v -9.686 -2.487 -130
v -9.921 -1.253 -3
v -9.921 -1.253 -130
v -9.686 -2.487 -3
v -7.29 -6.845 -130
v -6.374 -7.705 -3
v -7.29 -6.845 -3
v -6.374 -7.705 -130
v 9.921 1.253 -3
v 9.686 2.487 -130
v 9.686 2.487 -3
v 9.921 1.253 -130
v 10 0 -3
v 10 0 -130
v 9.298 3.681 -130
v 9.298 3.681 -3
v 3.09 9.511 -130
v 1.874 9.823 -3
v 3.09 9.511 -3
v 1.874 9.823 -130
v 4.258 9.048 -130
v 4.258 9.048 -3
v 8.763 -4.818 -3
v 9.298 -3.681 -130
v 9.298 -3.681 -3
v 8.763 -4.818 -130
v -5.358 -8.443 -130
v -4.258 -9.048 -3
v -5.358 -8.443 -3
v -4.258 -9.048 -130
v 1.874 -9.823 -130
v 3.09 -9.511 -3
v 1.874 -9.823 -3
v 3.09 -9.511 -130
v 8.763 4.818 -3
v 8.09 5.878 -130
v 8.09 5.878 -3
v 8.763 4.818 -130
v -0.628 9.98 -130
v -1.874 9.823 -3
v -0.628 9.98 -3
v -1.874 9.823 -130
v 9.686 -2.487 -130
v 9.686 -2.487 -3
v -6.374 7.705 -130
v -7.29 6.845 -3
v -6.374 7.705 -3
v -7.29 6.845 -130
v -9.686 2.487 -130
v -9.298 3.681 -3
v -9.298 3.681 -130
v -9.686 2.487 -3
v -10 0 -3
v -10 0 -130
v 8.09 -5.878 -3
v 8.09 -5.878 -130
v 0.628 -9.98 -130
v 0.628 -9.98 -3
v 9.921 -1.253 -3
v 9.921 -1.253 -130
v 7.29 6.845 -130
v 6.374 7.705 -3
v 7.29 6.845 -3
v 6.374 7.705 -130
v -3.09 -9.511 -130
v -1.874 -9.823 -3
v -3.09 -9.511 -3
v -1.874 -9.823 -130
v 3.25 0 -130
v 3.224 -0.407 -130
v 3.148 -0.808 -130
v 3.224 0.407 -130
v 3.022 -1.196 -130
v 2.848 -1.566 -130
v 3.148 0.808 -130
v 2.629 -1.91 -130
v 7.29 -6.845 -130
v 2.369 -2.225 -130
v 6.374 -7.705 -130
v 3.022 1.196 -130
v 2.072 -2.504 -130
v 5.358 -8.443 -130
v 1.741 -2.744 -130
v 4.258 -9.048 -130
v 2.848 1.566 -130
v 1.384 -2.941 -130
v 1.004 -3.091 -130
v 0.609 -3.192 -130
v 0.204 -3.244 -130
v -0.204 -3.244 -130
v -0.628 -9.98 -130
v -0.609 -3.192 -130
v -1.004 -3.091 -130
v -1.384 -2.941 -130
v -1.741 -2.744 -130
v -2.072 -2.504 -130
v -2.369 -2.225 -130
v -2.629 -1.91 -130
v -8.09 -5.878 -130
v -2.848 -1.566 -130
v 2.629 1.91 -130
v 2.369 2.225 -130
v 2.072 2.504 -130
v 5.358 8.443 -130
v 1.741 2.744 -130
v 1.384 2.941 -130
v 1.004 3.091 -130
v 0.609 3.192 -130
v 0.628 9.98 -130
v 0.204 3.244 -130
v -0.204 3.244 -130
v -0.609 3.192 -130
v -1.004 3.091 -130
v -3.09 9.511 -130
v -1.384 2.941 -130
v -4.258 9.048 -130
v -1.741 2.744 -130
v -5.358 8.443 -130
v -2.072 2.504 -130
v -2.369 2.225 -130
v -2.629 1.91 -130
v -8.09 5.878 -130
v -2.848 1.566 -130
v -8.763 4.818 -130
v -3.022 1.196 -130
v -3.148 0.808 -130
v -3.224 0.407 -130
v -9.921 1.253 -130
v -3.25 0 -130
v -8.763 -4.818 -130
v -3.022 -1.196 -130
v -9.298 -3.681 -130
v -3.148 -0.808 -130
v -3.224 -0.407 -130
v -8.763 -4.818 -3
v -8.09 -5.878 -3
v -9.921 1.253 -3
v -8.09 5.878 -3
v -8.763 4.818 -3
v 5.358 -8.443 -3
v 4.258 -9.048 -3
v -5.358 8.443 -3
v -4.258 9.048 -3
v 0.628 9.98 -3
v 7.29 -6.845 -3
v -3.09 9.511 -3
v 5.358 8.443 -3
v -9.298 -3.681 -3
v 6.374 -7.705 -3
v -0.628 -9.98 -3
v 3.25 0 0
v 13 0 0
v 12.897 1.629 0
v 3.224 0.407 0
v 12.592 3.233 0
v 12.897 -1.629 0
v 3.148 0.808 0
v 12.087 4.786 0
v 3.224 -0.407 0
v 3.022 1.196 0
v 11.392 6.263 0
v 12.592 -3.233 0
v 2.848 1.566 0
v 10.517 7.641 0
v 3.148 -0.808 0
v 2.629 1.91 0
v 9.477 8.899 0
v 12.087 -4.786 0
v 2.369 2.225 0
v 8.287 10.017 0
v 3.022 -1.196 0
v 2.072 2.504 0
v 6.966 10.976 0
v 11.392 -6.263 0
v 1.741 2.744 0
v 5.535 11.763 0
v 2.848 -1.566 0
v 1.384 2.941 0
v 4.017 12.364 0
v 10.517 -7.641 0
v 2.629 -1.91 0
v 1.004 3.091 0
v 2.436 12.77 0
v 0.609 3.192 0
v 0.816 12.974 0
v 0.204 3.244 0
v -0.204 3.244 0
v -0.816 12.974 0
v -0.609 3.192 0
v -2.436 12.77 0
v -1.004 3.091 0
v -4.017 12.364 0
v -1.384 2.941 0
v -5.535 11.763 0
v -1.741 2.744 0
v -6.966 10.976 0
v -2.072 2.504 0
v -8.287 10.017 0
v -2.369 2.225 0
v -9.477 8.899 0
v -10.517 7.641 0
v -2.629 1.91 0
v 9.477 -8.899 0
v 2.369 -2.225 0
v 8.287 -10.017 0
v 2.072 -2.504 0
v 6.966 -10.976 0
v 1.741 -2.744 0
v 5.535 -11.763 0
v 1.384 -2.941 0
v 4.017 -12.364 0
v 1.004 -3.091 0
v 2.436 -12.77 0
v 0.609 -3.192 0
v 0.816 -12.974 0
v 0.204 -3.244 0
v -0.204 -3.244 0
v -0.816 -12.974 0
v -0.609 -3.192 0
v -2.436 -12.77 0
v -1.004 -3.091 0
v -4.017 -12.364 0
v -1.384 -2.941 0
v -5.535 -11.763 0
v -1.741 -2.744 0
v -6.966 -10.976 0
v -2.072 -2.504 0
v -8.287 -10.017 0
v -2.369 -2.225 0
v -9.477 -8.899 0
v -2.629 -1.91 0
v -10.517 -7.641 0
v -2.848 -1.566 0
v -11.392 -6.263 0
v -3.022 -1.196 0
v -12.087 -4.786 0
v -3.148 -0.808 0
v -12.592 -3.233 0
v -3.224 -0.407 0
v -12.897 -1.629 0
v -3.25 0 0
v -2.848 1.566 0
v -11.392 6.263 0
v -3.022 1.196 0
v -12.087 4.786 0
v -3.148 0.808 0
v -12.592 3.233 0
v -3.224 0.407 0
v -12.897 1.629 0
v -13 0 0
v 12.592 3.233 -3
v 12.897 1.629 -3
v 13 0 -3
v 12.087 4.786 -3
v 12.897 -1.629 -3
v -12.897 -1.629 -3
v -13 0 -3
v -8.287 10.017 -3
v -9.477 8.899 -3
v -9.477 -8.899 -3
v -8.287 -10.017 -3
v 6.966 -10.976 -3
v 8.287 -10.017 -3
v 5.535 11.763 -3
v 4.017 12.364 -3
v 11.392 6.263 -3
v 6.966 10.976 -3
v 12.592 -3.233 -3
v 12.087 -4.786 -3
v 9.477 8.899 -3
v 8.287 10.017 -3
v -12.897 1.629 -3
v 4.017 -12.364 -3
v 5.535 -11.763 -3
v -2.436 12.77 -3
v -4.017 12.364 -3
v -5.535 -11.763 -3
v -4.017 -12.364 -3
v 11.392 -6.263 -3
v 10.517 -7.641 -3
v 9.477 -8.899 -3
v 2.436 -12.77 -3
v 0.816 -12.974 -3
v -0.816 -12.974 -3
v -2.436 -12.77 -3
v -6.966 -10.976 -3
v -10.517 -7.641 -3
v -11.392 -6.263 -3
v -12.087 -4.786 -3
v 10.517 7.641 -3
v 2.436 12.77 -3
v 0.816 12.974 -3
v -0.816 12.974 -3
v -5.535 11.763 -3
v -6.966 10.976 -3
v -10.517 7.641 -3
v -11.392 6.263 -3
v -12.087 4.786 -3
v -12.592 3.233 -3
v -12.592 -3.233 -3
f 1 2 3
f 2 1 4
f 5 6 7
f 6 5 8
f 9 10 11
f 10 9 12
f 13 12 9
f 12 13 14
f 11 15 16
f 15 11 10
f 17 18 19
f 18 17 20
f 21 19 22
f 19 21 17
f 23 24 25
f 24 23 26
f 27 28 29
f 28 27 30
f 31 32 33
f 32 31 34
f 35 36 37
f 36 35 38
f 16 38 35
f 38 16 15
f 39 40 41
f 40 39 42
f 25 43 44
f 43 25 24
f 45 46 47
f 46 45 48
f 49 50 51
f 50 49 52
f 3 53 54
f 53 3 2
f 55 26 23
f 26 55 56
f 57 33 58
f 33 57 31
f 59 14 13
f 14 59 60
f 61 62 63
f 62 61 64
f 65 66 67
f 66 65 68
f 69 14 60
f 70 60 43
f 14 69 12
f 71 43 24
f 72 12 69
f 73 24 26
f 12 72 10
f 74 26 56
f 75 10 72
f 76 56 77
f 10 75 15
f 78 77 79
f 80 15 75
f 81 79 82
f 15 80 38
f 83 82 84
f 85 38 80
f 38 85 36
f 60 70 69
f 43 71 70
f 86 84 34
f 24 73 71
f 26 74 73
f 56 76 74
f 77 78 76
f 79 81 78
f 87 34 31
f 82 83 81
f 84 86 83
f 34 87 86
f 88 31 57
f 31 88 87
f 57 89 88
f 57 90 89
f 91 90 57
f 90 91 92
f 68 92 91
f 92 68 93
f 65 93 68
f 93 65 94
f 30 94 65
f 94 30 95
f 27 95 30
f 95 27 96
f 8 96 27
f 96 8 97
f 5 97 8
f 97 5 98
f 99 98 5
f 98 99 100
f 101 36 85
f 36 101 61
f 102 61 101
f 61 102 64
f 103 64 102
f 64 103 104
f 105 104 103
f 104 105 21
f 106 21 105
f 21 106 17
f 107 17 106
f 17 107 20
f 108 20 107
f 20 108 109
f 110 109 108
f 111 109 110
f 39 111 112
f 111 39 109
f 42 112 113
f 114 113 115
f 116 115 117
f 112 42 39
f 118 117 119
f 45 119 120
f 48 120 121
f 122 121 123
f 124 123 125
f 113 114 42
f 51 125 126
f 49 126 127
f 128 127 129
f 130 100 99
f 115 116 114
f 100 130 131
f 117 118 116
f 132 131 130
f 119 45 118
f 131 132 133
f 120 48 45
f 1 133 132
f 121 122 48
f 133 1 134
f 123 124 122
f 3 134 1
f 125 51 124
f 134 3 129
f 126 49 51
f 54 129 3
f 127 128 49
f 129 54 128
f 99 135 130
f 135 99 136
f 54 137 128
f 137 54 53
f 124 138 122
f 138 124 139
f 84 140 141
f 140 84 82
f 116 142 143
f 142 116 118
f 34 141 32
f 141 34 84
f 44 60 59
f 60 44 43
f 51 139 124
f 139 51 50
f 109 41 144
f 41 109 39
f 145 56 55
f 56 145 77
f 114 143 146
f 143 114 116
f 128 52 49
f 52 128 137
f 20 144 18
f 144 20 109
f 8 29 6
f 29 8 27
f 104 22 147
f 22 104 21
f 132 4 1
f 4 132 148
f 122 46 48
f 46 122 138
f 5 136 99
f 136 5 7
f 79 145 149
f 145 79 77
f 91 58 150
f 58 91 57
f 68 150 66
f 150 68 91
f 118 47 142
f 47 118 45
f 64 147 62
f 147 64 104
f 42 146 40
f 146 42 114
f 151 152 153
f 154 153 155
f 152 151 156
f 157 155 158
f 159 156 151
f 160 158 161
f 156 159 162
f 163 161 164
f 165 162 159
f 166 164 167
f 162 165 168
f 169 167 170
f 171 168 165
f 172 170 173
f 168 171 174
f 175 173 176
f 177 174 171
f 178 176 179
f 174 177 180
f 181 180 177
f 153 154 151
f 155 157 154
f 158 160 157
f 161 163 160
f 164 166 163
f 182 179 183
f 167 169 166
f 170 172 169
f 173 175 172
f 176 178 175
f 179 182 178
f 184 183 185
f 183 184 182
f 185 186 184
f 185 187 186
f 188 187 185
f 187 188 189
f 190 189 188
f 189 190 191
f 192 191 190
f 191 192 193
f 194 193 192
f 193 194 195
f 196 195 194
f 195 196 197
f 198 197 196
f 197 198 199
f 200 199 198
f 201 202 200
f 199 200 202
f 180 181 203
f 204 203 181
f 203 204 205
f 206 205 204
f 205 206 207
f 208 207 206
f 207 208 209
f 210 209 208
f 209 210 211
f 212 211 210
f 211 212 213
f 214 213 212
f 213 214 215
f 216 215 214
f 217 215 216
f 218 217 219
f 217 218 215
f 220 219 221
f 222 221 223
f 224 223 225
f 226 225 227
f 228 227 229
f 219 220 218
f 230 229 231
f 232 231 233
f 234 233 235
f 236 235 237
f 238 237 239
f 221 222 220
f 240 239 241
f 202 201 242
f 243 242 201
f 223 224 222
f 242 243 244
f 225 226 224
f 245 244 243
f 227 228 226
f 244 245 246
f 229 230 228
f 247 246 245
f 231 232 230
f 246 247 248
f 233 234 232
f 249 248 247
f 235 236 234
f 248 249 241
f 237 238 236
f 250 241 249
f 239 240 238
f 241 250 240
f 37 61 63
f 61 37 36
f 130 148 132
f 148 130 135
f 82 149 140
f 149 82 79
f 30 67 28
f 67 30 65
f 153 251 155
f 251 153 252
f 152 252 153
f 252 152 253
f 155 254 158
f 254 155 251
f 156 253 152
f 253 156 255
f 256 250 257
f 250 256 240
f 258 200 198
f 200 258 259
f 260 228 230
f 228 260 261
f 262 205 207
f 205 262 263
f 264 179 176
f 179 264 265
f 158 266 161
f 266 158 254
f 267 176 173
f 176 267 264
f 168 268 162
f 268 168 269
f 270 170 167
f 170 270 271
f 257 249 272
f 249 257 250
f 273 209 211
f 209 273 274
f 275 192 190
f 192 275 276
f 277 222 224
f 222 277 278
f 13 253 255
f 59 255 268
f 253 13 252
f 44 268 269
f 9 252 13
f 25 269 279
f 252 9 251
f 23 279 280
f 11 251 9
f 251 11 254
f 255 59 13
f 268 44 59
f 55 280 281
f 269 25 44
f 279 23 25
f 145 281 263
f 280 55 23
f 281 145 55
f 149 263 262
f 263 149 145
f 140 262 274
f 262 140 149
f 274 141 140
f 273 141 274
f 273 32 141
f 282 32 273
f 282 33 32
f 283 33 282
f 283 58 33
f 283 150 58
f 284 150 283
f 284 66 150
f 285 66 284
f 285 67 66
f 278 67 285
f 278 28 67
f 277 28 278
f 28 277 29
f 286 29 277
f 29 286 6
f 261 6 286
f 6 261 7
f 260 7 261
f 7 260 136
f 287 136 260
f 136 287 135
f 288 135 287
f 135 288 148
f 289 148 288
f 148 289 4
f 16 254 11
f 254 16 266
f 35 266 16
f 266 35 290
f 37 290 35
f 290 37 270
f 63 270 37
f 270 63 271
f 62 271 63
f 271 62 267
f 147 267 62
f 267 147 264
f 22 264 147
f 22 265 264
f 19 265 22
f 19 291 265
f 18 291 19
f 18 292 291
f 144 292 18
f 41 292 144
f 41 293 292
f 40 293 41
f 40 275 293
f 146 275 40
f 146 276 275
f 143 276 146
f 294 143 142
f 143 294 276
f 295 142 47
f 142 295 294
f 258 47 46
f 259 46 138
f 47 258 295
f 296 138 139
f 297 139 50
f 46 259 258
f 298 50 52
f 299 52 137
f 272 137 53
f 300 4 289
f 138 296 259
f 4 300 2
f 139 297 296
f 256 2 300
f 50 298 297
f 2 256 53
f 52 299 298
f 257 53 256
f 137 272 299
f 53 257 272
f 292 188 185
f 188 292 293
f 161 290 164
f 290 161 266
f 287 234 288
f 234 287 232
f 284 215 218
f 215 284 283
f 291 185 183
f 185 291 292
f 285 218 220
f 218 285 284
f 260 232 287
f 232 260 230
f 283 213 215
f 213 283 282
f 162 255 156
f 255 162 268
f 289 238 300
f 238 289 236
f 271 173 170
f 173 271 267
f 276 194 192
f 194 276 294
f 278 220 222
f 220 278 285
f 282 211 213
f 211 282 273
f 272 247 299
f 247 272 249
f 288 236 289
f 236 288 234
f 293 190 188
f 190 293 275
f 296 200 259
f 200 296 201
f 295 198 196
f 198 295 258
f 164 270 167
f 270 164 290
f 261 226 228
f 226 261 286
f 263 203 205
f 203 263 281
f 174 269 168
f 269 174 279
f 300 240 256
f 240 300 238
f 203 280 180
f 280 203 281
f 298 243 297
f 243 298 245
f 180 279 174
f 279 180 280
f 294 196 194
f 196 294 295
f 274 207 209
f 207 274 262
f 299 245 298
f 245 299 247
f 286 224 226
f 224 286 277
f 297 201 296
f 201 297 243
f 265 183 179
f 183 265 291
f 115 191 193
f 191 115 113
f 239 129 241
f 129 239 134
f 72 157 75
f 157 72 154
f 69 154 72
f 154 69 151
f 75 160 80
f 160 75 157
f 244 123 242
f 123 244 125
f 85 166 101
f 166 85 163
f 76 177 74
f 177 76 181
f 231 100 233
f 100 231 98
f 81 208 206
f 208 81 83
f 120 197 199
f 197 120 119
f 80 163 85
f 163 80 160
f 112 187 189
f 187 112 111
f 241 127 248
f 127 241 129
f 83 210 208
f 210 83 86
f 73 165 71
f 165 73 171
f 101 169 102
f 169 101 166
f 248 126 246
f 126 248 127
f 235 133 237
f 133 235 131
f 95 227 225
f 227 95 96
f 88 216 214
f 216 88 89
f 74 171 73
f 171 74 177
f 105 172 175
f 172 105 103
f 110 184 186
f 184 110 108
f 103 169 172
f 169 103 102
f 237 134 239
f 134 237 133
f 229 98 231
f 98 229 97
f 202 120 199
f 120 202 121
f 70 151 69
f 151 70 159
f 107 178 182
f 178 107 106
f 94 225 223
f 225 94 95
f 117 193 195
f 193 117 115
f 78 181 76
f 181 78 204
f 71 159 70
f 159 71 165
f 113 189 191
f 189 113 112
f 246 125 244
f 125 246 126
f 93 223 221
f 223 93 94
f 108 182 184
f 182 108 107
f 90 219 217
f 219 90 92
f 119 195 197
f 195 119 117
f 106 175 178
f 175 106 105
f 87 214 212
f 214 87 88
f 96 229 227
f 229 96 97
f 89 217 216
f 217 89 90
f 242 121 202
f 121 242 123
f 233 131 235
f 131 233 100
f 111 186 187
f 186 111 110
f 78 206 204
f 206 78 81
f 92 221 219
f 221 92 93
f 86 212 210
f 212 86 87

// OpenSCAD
$fn = 50;


difference() {
	union() {
		translate(v = [0, 0, -130.0000000000]) {
			cylinder(h = 130, r = 10.0000000000);
		}
		translate(v = [0, 0, -3.0000000000]) {
			cylinder(h = 3, r = 13.0000000000);
		}
	}
	union() {
		#translate(v = [0, 0, -130]) {
			cylinder(h = 130, r = 3.2500000000);
		}
	}
}
